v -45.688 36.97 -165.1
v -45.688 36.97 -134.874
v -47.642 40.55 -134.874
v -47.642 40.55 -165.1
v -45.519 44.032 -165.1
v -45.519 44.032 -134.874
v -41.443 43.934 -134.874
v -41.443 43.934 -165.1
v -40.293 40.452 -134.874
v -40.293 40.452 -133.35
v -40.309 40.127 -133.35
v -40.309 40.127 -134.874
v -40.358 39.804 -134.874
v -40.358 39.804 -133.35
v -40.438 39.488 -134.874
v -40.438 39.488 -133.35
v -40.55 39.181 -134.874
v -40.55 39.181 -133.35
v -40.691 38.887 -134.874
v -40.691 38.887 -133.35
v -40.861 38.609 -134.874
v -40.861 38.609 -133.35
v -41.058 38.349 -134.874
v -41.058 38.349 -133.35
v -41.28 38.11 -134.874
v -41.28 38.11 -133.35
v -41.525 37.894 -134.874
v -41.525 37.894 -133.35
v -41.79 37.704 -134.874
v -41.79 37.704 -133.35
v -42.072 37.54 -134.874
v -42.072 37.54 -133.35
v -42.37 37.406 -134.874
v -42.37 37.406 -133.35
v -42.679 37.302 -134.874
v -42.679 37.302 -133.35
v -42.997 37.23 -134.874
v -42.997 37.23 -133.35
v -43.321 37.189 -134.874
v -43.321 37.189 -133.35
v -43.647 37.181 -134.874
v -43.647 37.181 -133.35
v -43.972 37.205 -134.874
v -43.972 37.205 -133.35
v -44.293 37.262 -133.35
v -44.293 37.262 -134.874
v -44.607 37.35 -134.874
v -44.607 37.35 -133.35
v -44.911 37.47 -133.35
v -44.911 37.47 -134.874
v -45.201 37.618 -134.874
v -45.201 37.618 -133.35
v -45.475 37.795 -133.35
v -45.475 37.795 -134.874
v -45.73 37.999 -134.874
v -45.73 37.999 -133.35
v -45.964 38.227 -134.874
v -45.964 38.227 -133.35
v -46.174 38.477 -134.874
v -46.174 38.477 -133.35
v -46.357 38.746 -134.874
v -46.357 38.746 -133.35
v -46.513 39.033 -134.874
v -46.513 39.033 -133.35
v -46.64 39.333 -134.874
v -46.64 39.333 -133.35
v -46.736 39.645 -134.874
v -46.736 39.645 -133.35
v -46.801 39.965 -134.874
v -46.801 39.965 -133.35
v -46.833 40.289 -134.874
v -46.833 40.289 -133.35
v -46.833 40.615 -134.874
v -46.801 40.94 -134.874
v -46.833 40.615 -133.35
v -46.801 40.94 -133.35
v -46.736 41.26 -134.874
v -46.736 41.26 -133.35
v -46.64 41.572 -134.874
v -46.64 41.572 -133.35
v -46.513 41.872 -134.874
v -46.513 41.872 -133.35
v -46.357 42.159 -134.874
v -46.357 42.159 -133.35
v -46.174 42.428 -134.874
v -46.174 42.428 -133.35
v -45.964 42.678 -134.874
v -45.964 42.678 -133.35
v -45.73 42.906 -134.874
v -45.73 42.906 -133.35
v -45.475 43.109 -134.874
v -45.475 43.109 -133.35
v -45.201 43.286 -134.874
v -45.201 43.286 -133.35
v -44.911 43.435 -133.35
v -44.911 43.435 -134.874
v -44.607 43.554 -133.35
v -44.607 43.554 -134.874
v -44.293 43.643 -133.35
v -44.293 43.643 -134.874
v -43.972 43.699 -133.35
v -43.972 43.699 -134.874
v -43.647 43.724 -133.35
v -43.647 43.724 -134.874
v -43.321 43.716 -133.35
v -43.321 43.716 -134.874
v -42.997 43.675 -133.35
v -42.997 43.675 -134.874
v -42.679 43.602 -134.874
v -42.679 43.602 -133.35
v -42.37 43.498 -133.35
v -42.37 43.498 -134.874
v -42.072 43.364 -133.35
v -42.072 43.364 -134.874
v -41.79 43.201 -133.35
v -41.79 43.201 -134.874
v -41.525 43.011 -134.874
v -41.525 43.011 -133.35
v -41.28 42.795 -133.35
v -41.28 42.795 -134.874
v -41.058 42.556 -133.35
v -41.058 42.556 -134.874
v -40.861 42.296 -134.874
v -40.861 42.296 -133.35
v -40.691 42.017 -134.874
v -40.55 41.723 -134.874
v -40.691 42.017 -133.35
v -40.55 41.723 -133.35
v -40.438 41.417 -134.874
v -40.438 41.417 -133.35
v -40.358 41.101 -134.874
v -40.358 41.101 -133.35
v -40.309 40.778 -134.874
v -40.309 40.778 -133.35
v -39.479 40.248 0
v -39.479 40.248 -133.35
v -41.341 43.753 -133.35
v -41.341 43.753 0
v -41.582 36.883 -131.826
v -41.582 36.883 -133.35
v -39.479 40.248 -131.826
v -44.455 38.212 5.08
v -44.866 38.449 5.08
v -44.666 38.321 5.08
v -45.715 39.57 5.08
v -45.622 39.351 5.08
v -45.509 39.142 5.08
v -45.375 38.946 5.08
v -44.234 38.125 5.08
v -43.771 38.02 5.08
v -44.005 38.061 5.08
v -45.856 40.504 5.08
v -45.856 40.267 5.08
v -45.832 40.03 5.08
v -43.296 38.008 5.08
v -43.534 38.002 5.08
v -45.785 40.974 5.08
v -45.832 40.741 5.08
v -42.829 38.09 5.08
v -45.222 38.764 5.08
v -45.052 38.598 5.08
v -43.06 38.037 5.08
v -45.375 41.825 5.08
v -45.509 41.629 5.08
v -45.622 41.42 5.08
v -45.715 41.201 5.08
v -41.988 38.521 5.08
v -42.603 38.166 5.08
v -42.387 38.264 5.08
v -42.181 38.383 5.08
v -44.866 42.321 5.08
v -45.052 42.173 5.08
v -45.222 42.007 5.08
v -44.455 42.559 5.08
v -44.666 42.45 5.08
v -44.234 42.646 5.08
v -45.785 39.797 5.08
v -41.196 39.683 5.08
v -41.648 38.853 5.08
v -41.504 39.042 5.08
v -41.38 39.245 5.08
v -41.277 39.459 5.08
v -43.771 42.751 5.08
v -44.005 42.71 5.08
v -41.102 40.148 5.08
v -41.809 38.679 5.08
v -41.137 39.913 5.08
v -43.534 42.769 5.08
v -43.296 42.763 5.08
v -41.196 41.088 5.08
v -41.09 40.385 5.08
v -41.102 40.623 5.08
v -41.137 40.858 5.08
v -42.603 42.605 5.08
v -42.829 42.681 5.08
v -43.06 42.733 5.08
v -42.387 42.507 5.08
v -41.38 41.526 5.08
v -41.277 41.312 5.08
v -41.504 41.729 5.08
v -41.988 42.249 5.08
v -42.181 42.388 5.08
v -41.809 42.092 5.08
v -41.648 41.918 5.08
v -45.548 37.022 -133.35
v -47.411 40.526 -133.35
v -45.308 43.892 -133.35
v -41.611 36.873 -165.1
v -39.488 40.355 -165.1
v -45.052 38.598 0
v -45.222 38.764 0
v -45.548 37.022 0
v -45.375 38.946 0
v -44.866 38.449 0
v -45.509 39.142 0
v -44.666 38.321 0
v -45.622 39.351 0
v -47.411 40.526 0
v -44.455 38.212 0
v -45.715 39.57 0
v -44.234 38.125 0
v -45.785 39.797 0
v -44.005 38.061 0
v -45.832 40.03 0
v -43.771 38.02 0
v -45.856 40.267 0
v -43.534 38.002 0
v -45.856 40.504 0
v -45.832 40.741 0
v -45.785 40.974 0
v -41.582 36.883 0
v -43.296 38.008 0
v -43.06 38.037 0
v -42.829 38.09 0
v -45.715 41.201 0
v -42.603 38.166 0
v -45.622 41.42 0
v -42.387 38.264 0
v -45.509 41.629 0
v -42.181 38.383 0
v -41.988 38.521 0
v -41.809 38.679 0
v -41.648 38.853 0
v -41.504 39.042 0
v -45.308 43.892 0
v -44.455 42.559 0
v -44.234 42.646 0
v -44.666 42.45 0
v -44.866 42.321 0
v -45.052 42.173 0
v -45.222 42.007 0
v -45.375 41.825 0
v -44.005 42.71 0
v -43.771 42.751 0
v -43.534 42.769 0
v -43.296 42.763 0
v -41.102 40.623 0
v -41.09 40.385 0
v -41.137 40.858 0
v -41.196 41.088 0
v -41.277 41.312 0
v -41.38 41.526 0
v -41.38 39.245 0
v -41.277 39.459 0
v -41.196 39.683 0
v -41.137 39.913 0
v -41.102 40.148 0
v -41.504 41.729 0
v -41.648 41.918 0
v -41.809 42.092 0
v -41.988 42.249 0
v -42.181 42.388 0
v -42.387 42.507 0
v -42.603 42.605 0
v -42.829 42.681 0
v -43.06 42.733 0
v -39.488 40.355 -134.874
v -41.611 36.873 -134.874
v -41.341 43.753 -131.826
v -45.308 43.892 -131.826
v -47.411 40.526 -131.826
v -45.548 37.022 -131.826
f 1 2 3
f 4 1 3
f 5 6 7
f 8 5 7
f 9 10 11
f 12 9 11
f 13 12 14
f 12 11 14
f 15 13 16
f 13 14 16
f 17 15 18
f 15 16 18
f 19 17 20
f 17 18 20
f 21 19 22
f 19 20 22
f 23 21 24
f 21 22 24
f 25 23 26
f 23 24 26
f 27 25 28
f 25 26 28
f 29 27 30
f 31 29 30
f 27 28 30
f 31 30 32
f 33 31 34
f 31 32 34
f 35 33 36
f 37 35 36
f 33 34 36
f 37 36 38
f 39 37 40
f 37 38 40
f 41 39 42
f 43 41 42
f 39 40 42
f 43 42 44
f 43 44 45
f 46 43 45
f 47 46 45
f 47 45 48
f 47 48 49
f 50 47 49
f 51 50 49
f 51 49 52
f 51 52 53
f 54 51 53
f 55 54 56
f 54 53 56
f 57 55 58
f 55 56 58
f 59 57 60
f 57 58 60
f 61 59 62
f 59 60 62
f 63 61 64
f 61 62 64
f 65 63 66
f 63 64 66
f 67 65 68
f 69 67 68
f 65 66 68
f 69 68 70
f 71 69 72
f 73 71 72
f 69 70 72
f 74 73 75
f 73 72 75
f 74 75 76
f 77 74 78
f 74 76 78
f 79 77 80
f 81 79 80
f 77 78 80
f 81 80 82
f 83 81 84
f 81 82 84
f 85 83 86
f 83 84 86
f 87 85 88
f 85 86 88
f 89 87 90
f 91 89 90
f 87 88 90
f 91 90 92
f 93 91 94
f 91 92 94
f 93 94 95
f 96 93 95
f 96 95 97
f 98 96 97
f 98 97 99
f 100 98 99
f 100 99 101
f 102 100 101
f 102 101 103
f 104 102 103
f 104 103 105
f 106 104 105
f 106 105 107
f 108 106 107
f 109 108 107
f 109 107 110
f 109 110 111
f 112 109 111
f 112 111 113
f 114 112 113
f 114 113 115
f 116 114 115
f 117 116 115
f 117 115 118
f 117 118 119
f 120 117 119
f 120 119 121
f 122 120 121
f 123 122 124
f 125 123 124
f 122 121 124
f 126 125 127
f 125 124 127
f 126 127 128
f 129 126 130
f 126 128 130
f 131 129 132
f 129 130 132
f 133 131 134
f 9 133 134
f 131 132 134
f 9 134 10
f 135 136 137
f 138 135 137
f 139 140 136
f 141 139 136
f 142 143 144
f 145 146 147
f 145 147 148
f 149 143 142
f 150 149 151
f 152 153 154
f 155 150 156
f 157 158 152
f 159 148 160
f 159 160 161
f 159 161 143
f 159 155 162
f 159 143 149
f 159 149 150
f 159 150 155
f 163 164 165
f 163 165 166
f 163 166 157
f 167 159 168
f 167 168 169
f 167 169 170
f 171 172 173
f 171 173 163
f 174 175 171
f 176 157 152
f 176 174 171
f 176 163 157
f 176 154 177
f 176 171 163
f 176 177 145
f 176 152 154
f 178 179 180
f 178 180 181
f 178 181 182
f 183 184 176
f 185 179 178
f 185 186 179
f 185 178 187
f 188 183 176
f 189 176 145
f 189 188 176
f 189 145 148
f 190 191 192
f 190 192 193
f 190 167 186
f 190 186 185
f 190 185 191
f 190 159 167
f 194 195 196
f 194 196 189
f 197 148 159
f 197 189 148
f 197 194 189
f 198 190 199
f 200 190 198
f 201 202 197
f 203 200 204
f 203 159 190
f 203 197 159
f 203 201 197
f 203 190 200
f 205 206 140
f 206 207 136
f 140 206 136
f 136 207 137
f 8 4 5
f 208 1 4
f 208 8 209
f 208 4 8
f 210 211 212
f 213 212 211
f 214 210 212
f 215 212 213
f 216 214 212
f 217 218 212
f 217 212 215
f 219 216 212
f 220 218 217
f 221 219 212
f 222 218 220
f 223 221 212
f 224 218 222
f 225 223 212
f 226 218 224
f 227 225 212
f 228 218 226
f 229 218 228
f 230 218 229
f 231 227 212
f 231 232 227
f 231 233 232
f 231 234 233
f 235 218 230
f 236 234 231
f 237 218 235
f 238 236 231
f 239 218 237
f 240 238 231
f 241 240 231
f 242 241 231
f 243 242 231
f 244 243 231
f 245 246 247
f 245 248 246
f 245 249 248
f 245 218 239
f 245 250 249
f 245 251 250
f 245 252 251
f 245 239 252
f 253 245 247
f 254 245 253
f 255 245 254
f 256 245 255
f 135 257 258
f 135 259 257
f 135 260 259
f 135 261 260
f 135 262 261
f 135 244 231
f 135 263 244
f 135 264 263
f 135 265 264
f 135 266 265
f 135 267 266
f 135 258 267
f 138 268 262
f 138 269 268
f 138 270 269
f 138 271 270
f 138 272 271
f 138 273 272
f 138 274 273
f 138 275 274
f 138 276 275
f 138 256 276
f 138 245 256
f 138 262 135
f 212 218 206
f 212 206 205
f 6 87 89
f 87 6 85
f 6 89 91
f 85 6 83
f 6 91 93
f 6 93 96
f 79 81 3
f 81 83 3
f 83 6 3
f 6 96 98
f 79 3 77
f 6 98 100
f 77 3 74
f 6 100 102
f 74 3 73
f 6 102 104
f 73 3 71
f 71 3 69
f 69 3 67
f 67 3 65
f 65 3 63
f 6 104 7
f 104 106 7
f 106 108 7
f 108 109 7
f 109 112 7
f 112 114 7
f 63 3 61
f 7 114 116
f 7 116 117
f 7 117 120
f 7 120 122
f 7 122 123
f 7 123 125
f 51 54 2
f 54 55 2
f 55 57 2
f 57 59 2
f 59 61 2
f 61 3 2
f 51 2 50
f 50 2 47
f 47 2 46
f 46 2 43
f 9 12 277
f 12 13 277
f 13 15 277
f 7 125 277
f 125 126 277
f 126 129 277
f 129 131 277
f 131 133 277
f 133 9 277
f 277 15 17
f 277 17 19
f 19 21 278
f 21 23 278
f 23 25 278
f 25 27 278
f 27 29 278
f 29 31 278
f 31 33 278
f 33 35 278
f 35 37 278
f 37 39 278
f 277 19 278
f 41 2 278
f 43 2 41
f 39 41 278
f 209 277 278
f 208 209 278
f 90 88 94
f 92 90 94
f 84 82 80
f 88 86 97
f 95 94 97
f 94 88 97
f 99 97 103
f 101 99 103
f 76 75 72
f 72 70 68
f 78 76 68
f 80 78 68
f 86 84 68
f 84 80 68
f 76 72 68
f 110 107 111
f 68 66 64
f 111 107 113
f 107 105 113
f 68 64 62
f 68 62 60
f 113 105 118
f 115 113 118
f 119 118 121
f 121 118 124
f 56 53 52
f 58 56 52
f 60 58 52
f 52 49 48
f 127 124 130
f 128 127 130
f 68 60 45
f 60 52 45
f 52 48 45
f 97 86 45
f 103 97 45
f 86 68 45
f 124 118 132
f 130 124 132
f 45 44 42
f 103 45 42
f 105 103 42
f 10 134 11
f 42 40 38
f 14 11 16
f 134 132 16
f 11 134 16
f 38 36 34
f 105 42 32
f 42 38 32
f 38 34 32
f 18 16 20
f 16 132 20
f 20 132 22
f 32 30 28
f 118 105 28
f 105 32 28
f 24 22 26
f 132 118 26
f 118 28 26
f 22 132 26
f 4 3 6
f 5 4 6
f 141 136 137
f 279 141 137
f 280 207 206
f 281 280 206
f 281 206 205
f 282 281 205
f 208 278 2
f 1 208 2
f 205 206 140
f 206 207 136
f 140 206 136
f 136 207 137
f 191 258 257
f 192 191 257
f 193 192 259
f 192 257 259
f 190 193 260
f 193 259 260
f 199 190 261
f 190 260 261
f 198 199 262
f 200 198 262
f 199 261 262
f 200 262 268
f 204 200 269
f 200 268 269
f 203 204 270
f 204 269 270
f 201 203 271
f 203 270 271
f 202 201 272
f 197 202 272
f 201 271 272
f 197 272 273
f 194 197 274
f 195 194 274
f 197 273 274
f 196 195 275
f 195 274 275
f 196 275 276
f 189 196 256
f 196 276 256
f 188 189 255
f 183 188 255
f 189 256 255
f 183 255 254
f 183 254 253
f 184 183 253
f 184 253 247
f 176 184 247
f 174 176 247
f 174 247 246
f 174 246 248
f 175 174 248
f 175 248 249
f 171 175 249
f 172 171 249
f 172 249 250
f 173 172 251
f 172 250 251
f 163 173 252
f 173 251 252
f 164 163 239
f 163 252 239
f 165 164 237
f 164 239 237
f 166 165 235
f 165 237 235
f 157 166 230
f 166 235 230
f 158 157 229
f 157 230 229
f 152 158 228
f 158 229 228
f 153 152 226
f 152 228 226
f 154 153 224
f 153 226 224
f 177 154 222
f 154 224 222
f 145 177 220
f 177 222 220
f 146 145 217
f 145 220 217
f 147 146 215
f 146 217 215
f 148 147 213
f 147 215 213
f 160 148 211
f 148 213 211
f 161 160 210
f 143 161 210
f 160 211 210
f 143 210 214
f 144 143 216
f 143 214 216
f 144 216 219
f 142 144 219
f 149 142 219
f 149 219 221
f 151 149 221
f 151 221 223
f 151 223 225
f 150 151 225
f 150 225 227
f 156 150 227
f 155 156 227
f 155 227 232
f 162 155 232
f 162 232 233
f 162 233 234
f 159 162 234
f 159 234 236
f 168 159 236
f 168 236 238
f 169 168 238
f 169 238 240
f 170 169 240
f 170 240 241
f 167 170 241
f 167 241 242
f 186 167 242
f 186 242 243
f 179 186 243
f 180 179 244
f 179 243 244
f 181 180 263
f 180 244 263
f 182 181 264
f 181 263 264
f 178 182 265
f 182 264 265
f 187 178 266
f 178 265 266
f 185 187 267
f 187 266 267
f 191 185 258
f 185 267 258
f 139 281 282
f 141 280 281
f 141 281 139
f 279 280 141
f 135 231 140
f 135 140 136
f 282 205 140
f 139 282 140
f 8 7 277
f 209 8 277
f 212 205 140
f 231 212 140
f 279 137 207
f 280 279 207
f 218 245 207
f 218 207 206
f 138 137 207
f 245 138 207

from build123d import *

# Parameters (mm, degrees)
F1_DEPTH = 133.35
F2_R     = 2.384296381
F3_DEPTH = 5.08
F4_DEPTH = 1.524
F5_R     = 3.2723319481
F6_DEPTH = 1.524
F8_DEPTH = 30.226


with BuildPart() as f1:
    # F0 (on Top) → F1 (new body)
    with BuildSketch(Plane.XY):
        Polygon((-41.5820354619, 36.8828393166), (-39.4786010631, 40.2483318945), (-41.3414859324, 43.7527058081), (-45.3078052006, 43.8915871437), (-47.4112395994, 40.5260945657), (-45.5483547301, 37.0217206522), align=None)
    extrude(amount=-F1_DEPTH)

    # F2 (on face) → F3 (join)
    with BuildSketch(Plane.XY):
        with Locations((-43.4742867947, 40.3853803873)):
            Circle(F2_R)
    extrude(amount=F3_DEPTH)


with BuildPart() as f4:
    # F4 (new): a face of the model
    f4_faces = [f1.part.faces().sort_by_distance(p)[0] for p in [
        (-43.4449203312, 40.3872132301, -133.35),
    ]]
    extrude(f4_faces, amount=-F4_DEPTH)


with BuildPart() as f6:
    # F5 (on face) → F6 (new body)
    with BuildSketch(Plane(origin=(0, 0, -133.35), x_dir=(1, 0, 0), z_dir=(0, 0, -1))):
        with Locations((-43.565195096, -40.4523536563)):
            Circle(F5_R)
    extrude(amount=F6_DEPTH)

    # F7 (on face) → F8 (join)
    with BuildSketch(Plane(origin=(0, 0, -134.874), x_dir=(1, 0, 0), z_dir=(0, 0, -1))):
        Polygon((-39.4883785057, -40.355072412), (-41.6110348297, -36.8730863004), (-45.68785142, -36.9703675446), (-47.6420116863, -40.5496349006), (-45.5193553623, -44.0316210122), (-41.442538772, -43.9343397679), align=None)
    extrude(amount=F8_DEPTH)


solid = Compound([f1.part, f4.part, f6.part])
